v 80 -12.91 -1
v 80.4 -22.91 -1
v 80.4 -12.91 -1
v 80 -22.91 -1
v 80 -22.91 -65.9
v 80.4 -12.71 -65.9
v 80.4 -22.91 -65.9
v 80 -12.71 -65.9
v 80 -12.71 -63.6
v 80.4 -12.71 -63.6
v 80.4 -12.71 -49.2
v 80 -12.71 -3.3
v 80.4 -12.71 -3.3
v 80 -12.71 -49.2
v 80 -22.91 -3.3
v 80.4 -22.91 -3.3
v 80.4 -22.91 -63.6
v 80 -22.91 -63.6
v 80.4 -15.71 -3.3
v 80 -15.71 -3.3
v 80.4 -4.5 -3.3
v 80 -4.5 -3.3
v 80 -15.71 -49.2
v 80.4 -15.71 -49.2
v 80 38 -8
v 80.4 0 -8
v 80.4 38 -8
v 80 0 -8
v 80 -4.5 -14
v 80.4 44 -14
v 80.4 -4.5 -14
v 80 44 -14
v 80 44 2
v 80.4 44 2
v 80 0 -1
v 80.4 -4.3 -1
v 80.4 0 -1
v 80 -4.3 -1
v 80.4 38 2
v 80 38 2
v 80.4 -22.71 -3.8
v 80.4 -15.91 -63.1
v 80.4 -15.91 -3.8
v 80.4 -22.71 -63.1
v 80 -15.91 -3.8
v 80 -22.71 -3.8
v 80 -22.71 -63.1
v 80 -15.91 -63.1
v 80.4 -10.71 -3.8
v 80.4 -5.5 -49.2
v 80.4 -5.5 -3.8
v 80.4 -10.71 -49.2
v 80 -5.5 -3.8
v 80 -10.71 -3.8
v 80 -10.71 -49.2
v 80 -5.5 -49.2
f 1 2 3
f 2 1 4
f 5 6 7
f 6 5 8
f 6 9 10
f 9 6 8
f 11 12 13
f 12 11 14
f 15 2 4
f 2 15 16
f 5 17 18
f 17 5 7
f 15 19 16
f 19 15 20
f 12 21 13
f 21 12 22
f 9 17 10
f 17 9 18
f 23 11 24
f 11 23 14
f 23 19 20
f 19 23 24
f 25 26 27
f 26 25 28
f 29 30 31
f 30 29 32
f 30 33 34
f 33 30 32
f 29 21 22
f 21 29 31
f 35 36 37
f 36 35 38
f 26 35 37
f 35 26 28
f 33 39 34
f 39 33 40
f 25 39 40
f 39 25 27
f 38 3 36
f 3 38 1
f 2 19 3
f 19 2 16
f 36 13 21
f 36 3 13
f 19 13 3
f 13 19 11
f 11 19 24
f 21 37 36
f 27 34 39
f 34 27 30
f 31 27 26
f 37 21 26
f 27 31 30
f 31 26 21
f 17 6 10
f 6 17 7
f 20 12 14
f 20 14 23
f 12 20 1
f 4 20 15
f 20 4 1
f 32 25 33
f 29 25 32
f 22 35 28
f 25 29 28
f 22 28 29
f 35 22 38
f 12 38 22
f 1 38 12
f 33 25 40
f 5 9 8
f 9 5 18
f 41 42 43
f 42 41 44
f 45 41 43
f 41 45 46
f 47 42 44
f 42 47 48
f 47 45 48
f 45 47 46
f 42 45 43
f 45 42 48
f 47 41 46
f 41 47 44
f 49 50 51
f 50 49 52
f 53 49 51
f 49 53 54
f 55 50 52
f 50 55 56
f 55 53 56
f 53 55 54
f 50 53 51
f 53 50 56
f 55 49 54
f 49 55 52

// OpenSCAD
/*
 ESP32-P4 monitor clamp V6 -- panel maximum envelope 160 x 59.3 x 6.8 mm.
 X right, Y toward monitor rear, Z up. Board upper-left is defined when
 looking at the SCREEN FRONT; rear-view drawings therefore mirror X.
 V4 clamp, M5 thread, screw position and WORLD coordinates are unchanged.
 Only the screen frame, its connection and PCB support are revised.
 All dimensions in mm. This is a fit prototype, not a tested assembly.
*/
$fn = 64;

screen_w = 160;
screen_h = 59.3;
screen_t = 6.8;            // corrected maximum assembled screen thickness
screen_edge_clearance = 0.5; // per side: opening 161 x 60.3
frame_wall = 2.3;
screen_front_recess = 0.2;
adhesive_allowance = 0.2;

board_w = 99;
board_h = 45.4;
board_max_t = 5.21;       // inherited assembly envelope; editable
board_x0 = 0;
board_standoff = 2.0;    // gap from backplate to PCB rear
board_clamp_clearance = 1.0;
backplate_t = 3.0;
board_hole_nominal_d = 3.0;
board_hole_edge_gap = 2.0;
board_hole_inset = board_hole_edge_gap + board_hole_nominal_d/2;
board_hole_shift_x = -1.0; // both screw axes left, as viewed from screen FRONT
board_screw_clearance_d = 3.2;
board_boss_d = 6.4;
board_nut_af = 5.7;      // M3 hex nut pocket, across flats
board_nut_depth = 2.5;   // pocket opens on SCREEN side; nut must sit flush

// V4 CLAMP DATUM: preserve positions, do NOT derive from new screen width.
clamp_length = 96;
clamp_inner_gap = 38;
clamp_x_right = 157.8;
clamp_x_left = clamp_x_right-clamp_length;
clamp_front_t = 4.5;
clamp_rear_t = 6.0;
clamp_spine_t = 6.0;
clamp_spine_bottom_z = -14;
clamp_spine_top_z = clamp_spine_bottom_z+clamp_spine_t;
clamp_front_rise = 7.0;
clamp_rear_rise = 10.0;
clamp_rear_y = clamp_inner_gap;
front_lip_top_z = clamp_spine_top_z + clamp_front_rise;
screen_z0 = front_lip_top_z-screen_h-screen_edge_clearance-frame_wall;
board_top_z = screen_z0+screen_h;
board_bottom_z = board_top_z-board_h;

// Place the full PCB envelope ahead of the unchanged V4 front jaw.
// Components face away from the panel, toward +Y. No board/clamp overlap.
board_rearmost_y = -clamp_front_t-board_clamp_clearance;
board_mount_y = board_rearmost_y-board_max_t;
frame_back_y = board_mount_y-board_standoff;
frame_floor_y = frame_back_y-backplate_t;
frame_front_y = frame_floor_y-adhesive_allowance-screen_t-screen_front_recess;
// Panel pocket depth is 7.20 = 0.20 recess + 6.80 screen + 0.20 glue gap.
// All extra depth grows toward -Y (screen front); PCB/clamp stay fixed.
// There is NO 6-mm rear supporting rim and NO internal peripheral ledge.

// V4 M5 thread parameters -- unmodified.
screw_pitch = 0.8;
screw_minor_d = 4.40;
screw_major_d = 5.30;
screw_entry_d = 5.50;
screw_boss_y = 10.0;
screw_boss_w = 20.0;
screw_boss_h = 18.0;
screw_x = clamp_x_left + clamp_length/2;
screw_z = clamp_spine_top_z + clamp_rear_rise/2;
thread_steps_per_turn = 18;

show_placeholders = false;
part_mode = "full"; // full, thread_test, clamp_only, frame_only, backplate_only

function outer_x0() = -screen_edge_clearance-frame_wall;
function outer_z0() = screen_z0-screen_edge_clearance-frame_wall;
function outer_w() = screen_w+2*(screen_edge_clearance+frame_wall);
function outer_h() = screen_h+2*(screen_edge_clearance+frame_wall);
function screen_frame_top() = outer_z0()+outer_h();
function upper_pad_xs() = [board_x0+board_hole_inset,
                           board_x0+board_w-board_hole_inset];
function hole_xs() = [for (xx=upper_pad_xs()) xx+board_hole_shift_x];
function hole_z() = board_bottom_z+board_hole_inset;
module at_box(x,y,z,w,d,h) { translate([x,y,z]) cube([w,d,h]); }
module y_cylinder(x,y,z,d,h,n=64) {
    translate([x,y,z]) rotate([-90,0,0]) cylinder(d=d,h=h,$fn=n);
}

module lcd_frame() {
    // Constant 161 x 60.3 opening all the way through. No right FPC notch.
    difference() {
        at_box(outer_x0(),frame_front_y,outer_z0(),
               outer_w(),frame_back_y-frame_front_y,outer_h());
        at_box(-screen_edge_clearance,frame_front_y-1,
               screen_z0-screen_edge_clearance,
               screen_w+2*screen_edge_clearance,
               frame_back_y-frame_front_y+2,
               screen_h+2*screen_edge_clearance);
    }
}

module pcb_backplate() {
    // Plate stays within the PCB outline except 0.7-mm joins to the left
    // and upper frame walls. Screen outside PCB footprint stays open.
    difference() {
        union() {
            at_box(-0.7,frame_floor_y,board_bottom_z,
                   board_w+0.7,backplate_t,
                   screen_z0+screen_h+screen_edge_clearance+0.2-board_bottom_z);
            // Two lower screw bosses plus two upper supporting pads.
            // Move the screw bosses with their holes and captive nuts.
            for (xx=hole_xs())
                y_cylinder(xx,frame_back_y-0.1,hole_z(),
                           board_boss_d,board_standoff+0.1);
            // The two non-screw upper supports keep their V5 positions.
            for (xx=upper_pad_xs())
                y_cylinder(xx,frame_back_y-0.1,
                           board_top_z-board_hole_inset,
                           board_boss_d,board_standoff+0.1);
        }
        for (xx=hole_xs()) {
            y_cylinder(xx,frame_floor_y-0.1,hole_z(),
                       board_screw_clearance_d,
                       backplate_t+board_standoff+0.2);
            // Nut pockets move with the screws; left pocket remains inside
            // the existing 0.7-mm plate/frame join.
            translate([xx,frame_floor_y-0.1,hole_z()])
                rotate([-90,0,0]) rotate([0,0,30])
                cylinder(d=board_nut_af/cos(30),
                         h=board_nut_depth+0.1,$fn=6);
        }
    }
}

module frame_top_connection() {
    // Only the EXISTING top frame border carries the bridge to the jaw.
    // The former 31-mm web and both long vertical ties are removed.
    at_box(clamp_x_left,frame_back_y-0.2,
           screen_z0+screen_h+screen_edge_clearance,
           clamp_length,-clamp_front_t+0.2-(frame_back_y-0.2),frame_wall);
}

module clamp_body() {
    // Spine underneath the bottom monitor edge.
    at_box(clamp_x_left,-clamp_front_t,clamp_spine_bottom_z,
           clamp_length,clamp_inner_gap+clamp_front_t+clamp_rear_t,
           clamp_spine_t);
    // Front contact lip: only a short distance up the bottom bezel.
    at_box(clamp_x_left,-clamp_front_t,clamp_spine_top_z,
           clamp_length,clamp_front_t,clamp_front_rise);
    // Rear lip, thin along Z but thickened locally for threaded screw.
    at_box(clamp_x_left,clamp_rear_y,clamp_spine_top_z,
           clamp_length,clamp_rear_t,clamp_rear_rise);
    at_box(screw_x-screw_boss_w/2,clamp_rear_y+clamp_rear_t,
           screw_z-screw_boss_h/2,
           screw_boss_w,screw_boss_y,screw_boss_h);
}

// Accurate axial-pitch helix, modelled as a watertight swept cutter.
// The 4-point cross section is defined in the radius/axial plane.
// The female groove is cut by moving the cutter one pitch per revolution.
function thread_r(j) =
    j==0 || j==3 ? screw_minor_d/2-0.10 : screw_major_d/2;
function thread_axial(j) =
    j==0 ? -0.40*screw_pitch :
    j==1 ? -0.09*screw_pitch :
    j==2 ?  0.09*screw_pitch : 0.40*screw_pitch;

module helical_thread_cutter(thread_len) {
    steps = ceil(thread_len/screw_pitch*thread_steps_per_turn);
    points = [ for(i=[0:steps]) for(j=[0:3])
        let(a=360*thread_len*i/(steps*screw_pitch),
            z=thread_len*i/steps+thread_axial(j),
            r=thread_r(j))
        [r*cos(a),r*sin(a),z]
    ];
    // Triangulated side faces avoid non-planar helicoid quads.
    faces = concat(
        [for(i=[0:steps-1])for(j=[0:3])
            [4*i+j,4*(i+1)+j,4*(i+1)+(j+1)%4]],
        [for(i=[0:steps-1])for(j=[0:3])
            [4*i+j,4*(i+1)+(j+1)%4,4*i+(j+1)%4]],
        [[0,1,2],[0,2,3]],
        [[4*steps+3,4*steps+2,4*steps+1],
         [4*steps+3,4*steps+1,4*steps]]
    );
    polyhedron(points=points,faces=faces,convexity=20);
}

module threaded_m5_hole() {
    full_t = clamp_rear_t+screw_boss_y;
    // Rotate local Z to global +Y; this remains a RIGHT-HAND thread.
    translate([screw_x,clamp_rear_y-1,screw_z])
    rotate([-90,0,0])
    union() {
        cylinder(d=screw_minor_d,h=full_t+2,$fn=72);
        helical_thread_cutter(full_t+2);
        translate([0,0,0.9])
            cylinder(d1=screw_entry_d,d2=screw_minor_d,h=0.7);
        translate([0,0,full_t+0.4])
            cylinder(d1=screw_minor_d,d2=screw_entry_d,h=0.7);
    }
}

module printable_part() {
    difference() {
        union() {
            lcd_frame();
            pcb_backplate();
            frame_top_connection();
            clamp_body();
        }
        threaded_m5_hole();
    }
}

module m5_thread_test_coupon() {
    // Small trial print BEFORE the long one-piece clamp.
    difference() {
        at_box(screw_x-9,clamp_rear_y,screw_z-9,
               18,clamp_rear_t+screw_boss_y,18);
        threaded_m5_hole();
    }
}


// Display-only X=80mm section, not a printable part.
intersection() {
    color([0.20,0.34,0.52]) printable_part();
    at_box(80,-30,-70,.4,100,100);
}
color([0.25,0.65,0.90]) at_box(80,-22.71,-63.1,.4,6.8,59.3);
color([0.15,0.65,0.35]) at_box(80,-10.71,-49.2,.4,5.21,45.4);
